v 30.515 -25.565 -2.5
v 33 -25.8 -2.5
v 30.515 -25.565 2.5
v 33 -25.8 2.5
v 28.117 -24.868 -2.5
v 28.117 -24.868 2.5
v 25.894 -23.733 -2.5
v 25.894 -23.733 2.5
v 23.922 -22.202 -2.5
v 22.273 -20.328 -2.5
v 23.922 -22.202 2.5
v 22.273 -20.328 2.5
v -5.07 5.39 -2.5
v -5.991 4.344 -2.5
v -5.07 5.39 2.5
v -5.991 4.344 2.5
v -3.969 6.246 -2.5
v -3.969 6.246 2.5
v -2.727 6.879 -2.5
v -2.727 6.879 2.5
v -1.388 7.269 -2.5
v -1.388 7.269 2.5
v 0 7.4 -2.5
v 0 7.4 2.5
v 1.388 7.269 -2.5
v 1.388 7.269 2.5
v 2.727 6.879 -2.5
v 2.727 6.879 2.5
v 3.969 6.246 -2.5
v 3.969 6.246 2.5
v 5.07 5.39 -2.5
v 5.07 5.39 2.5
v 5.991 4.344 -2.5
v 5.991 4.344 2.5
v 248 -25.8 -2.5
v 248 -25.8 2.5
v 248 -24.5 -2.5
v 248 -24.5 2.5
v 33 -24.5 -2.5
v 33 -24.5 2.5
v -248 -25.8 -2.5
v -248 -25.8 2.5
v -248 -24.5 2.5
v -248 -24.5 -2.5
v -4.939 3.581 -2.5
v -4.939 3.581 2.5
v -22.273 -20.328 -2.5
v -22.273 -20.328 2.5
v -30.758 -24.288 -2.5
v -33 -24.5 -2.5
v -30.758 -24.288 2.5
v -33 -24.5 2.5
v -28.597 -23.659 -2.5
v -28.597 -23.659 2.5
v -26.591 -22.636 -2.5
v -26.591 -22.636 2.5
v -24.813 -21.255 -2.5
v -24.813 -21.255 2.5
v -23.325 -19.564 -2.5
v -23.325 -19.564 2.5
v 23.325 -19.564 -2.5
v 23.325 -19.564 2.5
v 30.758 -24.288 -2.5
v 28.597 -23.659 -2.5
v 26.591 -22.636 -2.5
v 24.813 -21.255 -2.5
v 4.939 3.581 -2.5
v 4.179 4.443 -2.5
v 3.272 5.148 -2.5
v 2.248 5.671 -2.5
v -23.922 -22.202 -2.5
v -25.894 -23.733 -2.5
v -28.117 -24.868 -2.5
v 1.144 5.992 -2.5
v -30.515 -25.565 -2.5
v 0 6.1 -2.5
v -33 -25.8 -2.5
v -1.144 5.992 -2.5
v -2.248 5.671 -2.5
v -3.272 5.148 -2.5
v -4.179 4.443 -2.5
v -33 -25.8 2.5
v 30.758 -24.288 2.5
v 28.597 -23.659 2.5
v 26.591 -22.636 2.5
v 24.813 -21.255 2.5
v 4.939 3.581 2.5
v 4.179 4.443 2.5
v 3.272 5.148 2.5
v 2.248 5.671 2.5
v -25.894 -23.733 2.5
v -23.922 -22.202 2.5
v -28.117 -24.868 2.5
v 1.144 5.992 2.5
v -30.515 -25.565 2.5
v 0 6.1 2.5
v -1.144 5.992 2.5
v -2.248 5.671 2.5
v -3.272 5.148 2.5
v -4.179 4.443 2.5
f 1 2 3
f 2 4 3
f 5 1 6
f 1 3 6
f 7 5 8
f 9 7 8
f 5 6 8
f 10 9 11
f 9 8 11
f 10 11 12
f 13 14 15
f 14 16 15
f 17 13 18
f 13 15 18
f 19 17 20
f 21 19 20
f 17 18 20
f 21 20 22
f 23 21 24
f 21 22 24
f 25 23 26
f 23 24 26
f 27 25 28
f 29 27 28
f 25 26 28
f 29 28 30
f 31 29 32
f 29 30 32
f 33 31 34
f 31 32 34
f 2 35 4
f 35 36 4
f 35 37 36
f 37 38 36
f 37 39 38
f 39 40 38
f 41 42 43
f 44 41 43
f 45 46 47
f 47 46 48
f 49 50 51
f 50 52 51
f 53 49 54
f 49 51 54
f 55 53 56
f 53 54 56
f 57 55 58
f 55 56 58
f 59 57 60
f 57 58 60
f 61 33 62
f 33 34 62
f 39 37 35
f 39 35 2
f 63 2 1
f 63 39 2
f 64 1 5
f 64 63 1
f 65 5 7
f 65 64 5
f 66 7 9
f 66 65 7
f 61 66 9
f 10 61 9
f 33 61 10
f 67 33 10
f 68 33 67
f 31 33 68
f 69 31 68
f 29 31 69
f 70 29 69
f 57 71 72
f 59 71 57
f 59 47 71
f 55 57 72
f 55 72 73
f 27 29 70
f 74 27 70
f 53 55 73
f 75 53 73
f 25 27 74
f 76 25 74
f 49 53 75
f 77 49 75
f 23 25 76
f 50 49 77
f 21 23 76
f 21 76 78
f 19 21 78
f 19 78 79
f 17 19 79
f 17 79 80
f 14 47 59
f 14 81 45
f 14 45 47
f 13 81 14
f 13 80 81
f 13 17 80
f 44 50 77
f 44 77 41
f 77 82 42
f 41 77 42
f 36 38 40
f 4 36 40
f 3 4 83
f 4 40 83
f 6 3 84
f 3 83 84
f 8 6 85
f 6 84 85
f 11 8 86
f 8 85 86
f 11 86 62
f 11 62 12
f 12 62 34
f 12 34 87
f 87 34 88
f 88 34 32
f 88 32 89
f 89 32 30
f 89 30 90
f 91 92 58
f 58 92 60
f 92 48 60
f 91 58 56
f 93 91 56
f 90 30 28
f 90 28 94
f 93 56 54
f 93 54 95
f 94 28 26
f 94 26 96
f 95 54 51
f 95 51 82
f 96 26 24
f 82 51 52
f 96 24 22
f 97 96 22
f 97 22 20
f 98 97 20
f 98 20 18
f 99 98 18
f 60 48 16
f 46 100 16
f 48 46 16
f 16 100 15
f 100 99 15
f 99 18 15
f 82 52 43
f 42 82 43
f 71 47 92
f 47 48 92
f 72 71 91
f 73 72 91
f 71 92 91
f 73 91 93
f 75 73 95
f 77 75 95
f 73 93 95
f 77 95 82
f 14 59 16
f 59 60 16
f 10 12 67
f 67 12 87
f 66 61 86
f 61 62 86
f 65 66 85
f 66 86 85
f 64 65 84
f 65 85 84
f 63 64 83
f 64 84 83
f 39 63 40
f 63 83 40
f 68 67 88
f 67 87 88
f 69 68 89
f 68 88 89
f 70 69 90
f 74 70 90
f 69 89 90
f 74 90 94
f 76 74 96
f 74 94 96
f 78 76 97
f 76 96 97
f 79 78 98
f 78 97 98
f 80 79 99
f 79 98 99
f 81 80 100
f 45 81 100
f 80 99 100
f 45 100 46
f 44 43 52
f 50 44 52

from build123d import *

# Parameters (mm, degrees)
EXTRUDE_THIN1_DEPTH = 2.5


with BuildPart() as part:
    # Sketch1 → Extrude-Thin1 (new body, symmetric)
    with BuildSketch(Plane.XY):
        with BuildLine():
            Line((-248, -24.5), (-33, -24.5))
            ThreePointArc((-33, -24.5), (-27.56956187, -23.194850479), (-23.325321853, -19.564492338))
            Line((-23.325321853, -19.564492338), (-5.991014082, 4.343702368))
            ThreePointArc((-5.991014082, 4.343702368), (0, 7.4), (5.991014082, 4.343702368))
            Line((5.991014082, 4.343702368), (23.325321853, -19.564492338))
            ThreePointArc((23.325321853, -19.564492338), (27.56956187, -23.194850479), (33, -24.5))
            Line((33, -24.5), (248, -24.5))
            Line((248, -24.5), (248, -25.8))
            Line((248, -25.8), (33, -25.8))
            ThreePointArc((33, -25.8), (26.978802911, -24.352867686), (22.272846406, -20.327575186))
            Line((22.272846406, -20.327575186), (4.938538636, 3.58061952))
            ThreePointArc((4.938538636, 3.58061952), (0, 6.1), (-4.938538636, 3.58061952))
            Line((-4.938538636, 3.58061952), (-22.272846406, -20.327575186))
            ThreePointArc((-22.272846406, -20.327575186), (-26.978802911, -24.352867686), (-33, -25.8))
            Line((-33, -25.8), (-248, -25.8))
            Line((-248, -25.8), (-248, -24.5))
        make_face()
    extrude(amount=EXTRUDE_THIN1_DEPTH, both=True)


solid = part.part
